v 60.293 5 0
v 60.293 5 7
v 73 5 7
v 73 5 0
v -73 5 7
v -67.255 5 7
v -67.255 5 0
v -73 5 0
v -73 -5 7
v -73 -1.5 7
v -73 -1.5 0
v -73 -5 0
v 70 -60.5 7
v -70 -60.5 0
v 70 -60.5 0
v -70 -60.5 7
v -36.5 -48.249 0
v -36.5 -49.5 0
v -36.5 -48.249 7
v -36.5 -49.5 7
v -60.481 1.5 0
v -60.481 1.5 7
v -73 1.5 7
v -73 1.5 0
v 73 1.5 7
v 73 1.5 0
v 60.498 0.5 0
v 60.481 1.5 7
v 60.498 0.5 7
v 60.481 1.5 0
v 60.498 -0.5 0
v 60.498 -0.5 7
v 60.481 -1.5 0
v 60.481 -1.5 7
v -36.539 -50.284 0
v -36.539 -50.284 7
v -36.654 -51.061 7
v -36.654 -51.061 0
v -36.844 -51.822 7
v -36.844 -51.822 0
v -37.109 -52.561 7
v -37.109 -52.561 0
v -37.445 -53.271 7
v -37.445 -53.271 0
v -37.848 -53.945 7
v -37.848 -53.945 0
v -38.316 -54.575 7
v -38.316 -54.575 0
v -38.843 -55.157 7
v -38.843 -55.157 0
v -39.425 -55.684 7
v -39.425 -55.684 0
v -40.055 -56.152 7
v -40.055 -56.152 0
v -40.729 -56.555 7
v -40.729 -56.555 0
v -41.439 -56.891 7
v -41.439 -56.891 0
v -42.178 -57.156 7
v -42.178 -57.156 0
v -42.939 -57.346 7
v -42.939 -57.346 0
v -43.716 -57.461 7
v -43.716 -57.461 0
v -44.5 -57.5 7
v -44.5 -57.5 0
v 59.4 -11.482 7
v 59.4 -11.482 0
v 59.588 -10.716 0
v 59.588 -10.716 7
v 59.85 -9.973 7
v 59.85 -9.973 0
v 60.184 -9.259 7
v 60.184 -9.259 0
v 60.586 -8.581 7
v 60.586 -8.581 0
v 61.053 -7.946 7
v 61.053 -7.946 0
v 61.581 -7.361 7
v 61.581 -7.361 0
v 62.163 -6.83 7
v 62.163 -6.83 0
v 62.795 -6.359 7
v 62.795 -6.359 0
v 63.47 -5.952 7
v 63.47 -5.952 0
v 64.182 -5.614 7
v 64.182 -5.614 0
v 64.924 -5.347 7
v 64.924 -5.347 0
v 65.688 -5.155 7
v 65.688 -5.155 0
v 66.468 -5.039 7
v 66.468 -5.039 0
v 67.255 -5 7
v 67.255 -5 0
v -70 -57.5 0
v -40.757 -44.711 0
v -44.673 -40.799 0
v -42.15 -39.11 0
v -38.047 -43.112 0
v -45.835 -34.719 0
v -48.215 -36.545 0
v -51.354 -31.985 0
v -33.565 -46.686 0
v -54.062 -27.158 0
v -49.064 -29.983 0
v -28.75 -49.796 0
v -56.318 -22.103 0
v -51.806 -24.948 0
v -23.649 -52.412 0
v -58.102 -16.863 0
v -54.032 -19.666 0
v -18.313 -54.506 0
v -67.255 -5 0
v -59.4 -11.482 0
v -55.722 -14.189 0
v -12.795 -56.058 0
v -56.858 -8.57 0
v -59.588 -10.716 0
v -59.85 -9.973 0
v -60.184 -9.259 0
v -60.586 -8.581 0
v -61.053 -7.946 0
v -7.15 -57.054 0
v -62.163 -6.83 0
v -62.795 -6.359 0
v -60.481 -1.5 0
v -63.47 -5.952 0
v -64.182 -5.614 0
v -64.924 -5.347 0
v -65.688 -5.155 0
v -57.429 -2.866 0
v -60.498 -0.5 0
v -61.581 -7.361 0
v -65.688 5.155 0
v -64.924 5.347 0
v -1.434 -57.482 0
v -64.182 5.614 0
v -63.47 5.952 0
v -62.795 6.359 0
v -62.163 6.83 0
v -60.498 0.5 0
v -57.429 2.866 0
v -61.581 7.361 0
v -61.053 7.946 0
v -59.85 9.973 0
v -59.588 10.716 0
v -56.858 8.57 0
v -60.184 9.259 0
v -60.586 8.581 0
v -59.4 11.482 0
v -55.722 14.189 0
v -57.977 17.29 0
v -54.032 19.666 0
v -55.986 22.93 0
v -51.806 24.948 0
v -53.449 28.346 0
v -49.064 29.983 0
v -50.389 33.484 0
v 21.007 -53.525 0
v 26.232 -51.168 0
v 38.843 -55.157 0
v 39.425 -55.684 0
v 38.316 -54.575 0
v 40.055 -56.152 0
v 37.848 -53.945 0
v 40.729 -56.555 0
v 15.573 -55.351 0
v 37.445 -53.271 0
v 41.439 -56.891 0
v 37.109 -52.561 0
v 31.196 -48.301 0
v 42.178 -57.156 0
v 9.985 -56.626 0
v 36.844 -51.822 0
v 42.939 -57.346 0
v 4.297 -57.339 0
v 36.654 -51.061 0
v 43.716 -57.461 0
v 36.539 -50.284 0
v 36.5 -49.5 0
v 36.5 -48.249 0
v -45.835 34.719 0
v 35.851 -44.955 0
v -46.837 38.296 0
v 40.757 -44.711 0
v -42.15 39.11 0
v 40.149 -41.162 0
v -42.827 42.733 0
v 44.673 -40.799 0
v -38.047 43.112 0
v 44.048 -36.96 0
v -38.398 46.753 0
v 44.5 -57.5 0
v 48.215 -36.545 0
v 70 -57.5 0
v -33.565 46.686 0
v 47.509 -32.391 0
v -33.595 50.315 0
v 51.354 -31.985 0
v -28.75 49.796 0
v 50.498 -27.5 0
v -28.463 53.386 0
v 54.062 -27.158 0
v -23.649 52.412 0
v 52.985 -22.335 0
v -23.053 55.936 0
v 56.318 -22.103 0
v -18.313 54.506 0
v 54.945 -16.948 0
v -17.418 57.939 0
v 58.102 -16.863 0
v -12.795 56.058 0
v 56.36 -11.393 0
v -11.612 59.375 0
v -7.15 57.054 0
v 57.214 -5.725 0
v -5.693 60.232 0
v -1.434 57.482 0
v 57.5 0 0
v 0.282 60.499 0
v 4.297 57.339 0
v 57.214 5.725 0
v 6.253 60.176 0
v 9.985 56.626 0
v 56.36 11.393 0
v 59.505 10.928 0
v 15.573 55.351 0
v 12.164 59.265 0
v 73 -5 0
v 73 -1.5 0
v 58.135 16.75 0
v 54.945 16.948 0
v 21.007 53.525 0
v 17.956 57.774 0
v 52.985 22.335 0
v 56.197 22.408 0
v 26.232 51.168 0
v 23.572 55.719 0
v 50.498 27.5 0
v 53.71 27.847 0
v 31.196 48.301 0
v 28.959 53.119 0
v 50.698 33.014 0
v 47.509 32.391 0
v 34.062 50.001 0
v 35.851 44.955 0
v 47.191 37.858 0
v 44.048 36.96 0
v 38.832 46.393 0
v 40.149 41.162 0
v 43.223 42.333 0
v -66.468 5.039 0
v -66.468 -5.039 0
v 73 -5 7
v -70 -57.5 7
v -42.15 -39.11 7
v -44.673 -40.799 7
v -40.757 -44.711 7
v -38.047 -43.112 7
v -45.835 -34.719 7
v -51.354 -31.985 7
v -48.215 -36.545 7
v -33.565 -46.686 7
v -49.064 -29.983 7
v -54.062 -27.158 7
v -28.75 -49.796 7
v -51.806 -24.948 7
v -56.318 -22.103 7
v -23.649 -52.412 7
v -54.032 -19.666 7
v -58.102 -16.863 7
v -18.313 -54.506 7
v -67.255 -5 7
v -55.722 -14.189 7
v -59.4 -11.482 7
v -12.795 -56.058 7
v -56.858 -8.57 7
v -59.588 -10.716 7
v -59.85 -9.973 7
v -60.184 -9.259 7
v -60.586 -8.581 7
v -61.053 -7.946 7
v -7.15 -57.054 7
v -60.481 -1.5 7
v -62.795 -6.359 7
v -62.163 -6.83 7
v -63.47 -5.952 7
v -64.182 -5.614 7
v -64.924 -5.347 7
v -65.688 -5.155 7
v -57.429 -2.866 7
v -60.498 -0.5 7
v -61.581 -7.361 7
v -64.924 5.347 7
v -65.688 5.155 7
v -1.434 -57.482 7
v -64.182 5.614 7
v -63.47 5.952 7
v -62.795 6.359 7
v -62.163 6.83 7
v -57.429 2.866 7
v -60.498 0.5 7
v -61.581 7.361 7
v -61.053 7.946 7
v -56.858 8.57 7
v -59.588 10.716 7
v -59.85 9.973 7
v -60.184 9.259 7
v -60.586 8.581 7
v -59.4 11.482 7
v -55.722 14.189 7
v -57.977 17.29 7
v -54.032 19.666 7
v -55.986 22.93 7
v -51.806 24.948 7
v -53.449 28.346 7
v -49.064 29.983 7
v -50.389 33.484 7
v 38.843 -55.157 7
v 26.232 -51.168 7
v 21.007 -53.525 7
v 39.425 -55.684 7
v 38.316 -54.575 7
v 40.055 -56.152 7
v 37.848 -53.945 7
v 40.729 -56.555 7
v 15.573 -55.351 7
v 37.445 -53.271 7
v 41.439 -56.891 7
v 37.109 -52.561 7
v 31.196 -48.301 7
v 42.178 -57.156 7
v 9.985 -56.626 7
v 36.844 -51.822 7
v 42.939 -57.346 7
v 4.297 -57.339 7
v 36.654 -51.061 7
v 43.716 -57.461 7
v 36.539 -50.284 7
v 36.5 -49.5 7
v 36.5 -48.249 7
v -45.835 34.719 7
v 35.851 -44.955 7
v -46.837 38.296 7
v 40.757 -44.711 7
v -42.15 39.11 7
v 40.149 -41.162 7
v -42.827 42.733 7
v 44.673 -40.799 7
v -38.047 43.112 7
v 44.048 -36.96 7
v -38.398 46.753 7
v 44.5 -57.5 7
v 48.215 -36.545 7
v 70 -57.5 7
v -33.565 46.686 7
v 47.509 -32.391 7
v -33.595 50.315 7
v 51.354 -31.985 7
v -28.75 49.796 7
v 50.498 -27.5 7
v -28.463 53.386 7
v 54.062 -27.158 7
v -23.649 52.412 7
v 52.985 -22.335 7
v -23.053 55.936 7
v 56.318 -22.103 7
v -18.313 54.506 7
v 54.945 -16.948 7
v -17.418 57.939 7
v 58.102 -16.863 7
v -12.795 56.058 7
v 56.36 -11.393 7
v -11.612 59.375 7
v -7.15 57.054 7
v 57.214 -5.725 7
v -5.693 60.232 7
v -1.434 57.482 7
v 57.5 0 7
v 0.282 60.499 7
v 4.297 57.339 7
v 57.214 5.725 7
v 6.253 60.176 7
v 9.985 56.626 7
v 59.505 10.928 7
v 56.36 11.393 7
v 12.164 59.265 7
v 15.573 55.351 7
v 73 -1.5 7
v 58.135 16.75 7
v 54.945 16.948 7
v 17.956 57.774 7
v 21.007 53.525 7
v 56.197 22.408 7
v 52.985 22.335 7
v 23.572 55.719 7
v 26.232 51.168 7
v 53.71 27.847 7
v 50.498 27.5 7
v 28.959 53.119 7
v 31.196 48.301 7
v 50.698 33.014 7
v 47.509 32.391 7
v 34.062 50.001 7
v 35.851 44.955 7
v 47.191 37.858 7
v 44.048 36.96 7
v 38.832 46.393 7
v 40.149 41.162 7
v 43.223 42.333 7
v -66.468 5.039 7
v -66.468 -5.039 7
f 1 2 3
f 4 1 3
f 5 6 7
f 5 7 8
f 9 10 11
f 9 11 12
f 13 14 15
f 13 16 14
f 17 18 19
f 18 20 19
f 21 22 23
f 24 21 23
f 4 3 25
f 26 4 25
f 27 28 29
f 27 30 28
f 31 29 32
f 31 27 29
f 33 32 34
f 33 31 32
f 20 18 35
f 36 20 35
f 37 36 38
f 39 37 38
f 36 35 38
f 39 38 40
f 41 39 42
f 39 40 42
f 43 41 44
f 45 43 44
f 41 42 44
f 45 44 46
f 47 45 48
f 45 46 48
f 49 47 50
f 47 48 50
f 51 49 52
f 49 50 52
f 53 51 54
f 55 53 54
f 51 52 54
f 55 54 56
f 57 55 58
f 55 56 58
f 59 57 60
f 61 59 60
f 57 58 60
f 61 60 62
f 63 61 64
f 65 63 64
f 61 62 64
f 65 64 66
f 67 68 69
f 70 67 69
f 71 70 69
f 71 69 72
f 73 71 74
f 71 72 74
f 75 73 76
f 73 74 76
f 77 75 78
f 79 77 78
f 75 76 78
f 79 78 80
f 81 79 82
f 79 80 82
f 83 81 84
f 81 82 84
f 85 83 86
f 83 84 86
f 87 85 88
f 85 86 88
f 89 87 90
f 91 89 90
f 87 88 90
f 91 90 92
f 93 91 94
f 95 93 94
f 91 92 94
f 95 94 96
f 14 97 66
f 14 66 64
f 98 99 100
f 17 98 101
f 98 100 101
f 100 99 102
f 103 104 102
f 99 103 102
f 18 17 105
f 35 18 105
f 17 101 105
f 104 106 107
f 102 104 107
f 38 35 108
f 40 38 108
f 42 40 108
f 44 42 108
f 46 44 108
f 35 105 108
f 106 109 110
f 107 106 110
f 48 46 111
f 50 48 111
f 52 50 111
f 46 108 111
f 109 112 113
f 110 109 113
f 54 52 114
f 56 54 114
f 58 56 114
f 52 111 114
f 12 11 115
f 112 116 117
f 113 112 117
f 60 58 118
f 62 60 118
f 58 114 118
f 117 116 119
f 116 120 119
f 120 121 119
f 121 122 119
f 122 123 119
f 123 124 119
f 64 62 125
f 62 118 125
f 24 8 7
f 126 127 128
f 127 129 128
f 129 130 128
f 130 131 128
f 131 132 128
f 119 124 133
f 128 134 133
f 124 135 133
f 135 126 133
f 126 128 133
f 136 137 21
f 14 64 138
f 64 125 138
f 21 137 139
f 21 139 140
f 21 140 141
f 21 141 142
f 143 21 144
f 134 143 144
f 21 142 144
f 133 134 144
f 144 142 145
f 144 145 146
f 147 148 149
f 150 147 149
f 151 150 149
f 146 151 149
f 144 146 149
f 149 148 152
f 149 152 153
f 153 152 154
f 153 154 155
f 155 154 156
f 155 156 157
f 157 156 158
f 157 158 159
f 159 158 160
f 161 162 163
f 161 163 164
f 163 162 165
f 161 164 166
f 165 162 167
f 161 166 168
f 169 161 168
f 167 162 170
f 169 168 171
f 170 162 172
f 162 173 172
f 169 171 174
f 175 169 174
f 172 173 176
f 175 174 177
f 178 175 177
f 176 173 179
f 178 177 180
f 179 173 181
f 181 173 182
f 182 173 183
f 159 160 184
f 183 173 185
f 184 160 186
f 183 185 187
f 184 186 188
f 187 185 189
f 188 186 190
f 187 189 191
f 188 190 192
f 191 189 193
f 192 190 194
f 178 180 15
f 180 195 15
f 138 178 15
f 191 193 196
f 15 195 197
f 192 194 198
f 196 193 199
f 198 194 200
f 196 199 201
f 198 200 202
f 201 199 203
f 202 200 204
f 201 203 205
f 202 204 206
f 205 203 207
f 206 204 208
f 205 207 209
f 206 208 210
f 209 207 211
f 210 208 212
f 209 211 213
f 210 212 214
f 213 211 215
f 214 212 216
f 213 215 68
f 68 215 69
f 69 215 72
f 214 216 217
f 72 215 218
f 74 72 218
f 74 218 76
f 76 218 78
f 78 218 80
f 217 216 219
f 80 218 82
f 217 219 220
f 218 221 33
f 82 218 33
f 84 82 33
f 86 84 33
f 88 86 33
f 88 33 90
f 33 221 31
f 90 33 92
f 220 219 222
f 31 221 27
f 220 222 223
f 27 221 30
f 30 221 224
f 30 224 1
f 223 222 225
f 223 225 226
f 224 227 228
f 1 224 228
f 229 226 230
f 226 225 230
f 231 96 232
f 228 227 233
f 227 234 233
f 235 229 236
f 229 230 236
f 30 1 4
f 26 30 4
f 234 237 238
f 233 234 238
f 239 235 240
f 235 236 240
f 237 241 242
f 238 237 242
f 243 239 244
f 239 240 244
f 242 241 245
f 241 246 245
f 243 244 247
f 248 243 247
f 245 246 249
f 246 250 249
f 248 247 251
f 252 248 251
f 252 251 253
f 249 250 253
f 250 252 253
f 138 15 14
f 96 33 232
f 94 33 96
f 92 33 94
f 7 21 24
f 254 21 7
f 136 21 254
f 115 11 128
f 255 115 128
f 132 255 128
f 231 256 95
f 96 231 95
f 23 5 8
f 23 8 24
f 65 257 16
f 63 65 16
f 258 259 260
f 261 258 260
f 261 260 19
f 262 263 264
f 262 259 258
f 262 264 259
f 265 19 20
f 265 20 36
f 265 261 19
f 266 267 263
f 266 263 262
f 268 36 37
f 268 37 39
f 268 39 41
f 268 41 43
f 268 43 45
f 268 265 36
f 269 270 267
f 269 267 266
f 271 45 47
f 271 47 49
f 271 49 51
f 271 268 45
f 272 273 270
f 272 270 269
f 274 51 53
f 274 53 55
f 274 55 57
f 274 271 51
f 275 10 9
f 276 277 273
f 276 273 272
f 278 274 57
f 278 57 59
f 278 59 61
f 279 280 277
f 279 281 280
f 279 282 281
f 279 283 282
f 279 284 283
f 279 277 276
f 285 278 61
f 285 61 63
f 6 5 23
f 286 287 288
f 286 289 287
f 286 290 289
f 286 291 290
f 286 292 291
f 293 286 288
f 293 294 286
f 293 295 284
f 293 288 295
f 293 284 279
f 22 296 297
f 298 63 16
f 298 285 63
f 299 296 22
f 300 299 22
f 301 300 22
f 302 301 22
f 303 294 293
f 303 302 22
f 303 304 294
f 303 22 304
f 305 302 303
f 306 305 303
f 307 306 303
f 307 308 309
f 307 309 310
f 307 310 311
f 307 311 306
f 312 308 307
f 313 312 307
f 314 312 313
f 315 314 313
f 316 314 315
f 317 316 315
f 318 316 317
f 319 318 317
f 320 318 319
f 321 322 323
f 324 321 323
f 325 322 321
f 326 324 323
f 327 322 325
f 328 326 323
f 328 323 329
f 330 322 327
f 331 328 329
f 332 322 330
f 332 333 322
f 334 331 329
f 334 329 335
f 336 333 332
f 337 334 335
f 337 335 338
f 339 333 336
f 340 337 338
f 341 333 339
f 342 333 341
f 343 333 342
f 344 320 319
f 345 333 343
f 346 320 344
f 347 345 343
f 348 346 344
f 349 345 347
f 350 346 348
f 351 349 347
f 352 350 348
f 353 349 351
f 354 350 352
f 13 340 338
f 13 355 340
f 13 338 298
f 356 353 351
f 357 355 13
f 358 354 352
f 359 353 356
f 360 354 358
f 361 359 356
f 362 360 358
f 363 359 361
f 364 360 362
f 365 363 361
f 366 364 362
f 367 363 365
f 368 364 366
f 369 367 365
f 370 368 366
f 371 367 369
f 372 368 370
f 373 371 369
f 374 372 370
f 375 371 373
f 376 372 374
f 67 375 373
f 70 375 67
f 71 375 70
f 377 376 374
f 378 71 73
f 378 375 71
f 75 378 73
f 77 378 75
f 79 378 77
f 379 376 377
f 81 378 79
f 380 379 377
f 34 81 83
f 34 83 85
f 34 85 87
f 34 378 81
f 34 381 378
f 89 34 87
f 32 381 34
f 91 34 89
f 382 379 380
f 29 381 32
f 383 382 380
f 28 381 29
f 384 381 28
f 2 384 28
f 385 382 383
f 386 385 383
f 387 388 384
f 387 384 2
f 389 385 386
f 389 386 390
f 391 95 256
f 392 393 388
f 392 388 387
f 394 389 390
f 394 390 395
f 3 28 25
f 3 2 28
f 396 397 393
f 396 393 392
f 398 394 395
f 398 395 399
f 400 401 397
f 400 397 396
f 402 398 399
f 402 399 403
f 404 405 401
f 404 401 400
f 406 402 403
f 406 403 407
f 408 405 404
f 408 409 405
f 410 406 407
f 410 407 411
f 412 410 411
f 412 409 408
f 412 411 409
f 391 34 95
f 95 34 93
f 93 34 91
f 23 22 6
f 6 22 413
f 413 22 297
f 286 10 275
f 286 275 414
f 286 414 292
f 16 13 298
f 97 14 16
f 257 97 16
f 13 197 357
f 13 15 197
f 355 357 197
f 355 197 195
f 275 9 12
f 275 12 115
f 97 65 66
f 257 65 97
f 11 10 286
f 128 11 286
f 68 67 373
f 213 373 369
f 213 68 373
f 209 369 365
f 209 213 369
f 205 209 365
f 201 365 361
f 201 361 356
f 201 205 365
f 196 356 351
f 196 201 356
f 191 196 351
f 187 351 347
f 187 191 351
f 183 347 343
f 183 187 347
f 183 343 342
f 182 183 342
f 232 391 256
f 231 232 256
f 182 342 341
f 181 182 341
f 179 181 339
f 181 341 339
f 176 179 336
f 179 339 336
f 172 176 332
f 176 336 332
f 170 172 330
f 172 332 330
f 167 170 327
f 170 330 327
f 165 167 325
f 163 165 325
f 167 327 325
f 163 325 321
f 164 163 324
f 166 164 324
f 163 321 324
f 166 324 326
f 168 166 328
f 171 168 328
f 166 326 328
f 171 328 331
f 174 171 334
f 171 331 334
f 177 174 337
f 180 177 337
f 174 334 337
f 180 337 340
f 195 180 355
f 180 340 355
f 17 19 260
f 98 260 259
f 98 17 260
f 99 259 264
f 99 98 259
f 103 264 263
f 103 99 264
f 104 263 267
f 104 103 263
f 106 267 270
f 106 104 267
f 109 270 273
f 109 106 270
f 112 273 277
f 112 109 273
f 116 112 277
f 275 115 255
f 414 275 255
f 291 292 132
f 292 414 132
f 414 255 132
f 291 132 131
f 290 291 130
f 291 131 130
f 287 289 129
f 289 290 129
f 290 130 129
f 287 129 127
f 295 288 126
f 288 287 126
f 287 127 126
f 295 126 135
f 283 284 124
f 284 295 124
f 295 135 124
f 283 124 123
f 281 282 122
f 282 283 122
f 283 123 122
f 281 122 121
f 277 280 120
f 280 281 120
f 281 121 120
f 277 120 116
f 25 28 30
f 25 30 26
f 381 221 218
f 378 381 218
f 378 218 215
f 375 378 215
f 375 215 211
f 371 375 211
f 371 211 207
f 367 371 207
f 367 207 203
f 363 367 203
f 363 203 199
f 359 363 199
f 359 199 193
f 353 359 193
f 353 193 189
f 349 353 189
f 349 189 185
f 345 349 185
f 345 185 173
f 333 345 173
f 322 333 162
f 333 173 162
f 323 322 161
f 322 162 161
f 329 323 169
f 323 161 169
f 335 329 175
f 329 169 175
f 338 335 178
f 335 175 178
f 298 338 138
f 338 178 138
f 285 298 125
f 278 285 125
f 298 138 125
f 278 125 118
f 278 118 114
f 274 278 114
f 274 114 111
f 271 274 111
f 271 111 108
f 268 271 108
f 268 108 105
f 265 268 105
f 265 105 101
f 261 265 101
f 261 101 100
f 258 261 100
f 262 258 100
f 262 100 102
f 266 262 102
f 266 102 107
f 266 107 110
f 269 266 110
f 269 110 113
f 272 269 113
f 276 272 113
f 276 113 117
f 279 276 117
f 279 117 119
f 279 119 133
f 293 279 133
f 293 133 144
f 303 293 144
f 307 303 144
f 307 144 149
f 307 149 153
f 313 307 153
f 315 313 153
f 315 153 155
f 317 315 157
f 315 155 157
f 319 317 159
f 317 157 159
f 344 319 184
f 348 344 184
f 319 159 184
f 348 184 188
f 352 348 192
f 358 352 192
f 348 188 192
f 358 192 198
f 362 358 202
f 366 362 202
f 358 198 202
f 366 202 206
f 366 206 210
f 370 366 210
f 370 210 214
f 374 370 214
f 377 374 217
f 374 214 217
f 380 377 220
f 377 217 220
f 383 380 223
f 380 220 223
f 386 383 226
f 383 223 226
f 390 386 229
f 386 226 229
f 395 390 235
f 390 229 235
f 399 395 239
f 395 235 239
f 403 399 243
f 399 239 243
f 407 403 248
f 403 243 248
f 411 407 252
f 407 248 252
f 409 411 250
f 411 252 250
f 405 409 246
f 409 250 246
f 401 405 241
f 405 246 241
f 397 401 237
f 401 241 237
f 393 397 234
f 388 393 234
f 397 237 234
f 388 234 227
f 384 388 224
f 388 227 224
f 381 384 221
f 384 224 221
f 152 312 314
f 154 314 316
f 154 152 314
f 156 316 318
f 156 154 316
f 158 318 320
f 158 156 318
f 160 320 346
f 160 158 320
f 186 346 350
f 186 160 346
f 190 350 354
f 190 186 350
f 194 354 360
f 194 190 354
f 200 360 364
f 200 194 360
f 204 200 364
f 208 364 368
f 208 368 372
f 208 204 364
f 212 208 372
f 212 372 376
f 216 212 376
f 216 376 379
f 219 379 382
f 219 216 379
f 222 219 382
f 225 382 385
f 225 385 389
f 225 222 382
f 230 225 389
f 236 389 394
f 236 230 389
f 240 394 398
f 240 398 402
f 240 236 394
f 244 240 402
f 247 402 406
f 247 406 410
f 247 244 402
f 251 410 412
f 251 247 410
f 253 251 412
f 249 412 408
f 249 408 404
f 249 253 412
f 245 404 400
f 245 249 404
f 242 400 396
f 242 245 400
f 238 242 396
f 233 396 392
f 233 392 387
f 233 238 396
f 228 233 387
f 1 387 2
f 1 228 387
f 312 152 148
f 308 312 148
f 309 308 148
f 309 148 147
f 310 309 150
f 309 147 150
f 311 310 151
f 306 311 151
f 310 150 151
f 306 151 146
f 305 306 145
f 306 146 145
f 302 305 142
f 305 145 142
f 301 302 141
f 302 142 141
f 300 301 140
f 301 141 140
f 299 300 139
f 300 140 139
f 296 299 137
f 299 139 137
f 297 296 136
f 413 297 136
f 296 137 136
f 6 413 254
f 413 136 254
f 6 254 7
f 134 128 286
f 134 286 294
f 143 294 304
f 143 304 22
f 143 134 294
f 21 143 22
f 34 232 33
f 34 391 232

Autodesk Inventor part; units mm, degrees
ref_plane "YZ Plane" through (0, 0, 0) normal (1, 0, 0) x (0, 1, 0)
ref_plane "XY Plane" through (0, 0, 0) normal (0, 0, 1) x (1, 0, 0)
sketch "Sketch1" plane through (0, 0, 0) normal (0, 0, 1) x (1, 0, 0)
  circle A0 centre (0, 0) radius 57.5
  circle A1 centre (0, 0) radius 60.5
  dimension "d0" = 115
  dimension "d1" = 121
extrude "Extrusion1" add sketch "Sketch1" along normal blind 7
ref_plane "Work Plane1" through (0, -59, 0) normal (0, 1, 0) x (-1, 0, 0)
sketch "Sketch2" plane through (0, -59, 0) normal (0, 1, 0) x (-1, 0, 0)
  point P0 (0, 0)
sketch "Sketch3" plane through (0, -59, 0) normal (0, 1, 0) x (-1, 0, 0)
  line L0 (0, 0) -> (-70, 0)
  line L1 (-70, 0) -> (-70, 7)
  line L2 (-70, 7) -> (0, 7)
  line L3 (0, 7) -> (0, 0)
  line L4 (0, 0) -> (70, 0)
  line L5 (70, 0) -> (70, 7)
  line L6 (70, 7) -> (0, 7)
  dimension "d5" = 70
  dimension "d6" = 7
extrude "Extrusion2" add sketch "Sketch3" along normal mid plane 3
sketch "Sketch4" plane through (0, 0, 7) normal (0, 0, 1) x (1, 0, 0)
  line L0 (48, 5) -> (73, 5)
  line L1 (73, 5) -> (73, -5)
  line L2 (73, -5) -> (48, -5)
  line L3 (48, -5) -> (48, 5)
  line L4 (48, 5) -> (73, -5) construction
  line L5 (73, 5) -> (48, -5) construction
  line L6 (48, 1.5) -> (73, 1.5)
  line L7 (73, 1.5) -> (73, -1.5)
  line L8 (73, -1.5) -> (48, -1.5)
  line L9 (48, -1.5) -> (48, 1.5)
  line L10 (48, 1.5) -> (73, -1.5) construction
  line L11 (73, 1.5) -> (48, -1.5) construction
  line L12 (0, 0) -> (0, -12.7)
  line L13 (-48, 5) -> (-73, 5)
  line L14 (-73, 5) -> (-73, -5)
  line L15 (-73, -5) -> (-48, -5)
  line L16 (-48, -5) -> (-48, 5)
  line L17 (-48, 5) -> (-73, -5) construction
  line L18 (-73, 5) -> (-48, -5) construction
  line L19 (-48, 1.5) -> (-73, 1.5)
  line L20 (-73, 1.5) -> (-73, -1.5)
  line L21 (-73, -1.5) -> (-48, -1.5)
  line L22 (-48, -1.5) -> (-48, 1.5)
  line L23 (-48, 1.5) -> (-73, -1.5) construction
  line L24 (-73, 1.5) -> (-48, -1.5) construction
  line L25 (-70, -60.5) -> (70, -60.5) projected
  line L26 (36.5, -75) -> (-36.5, -75)
  line L27 (-36.5, -75) -> (-36.5, -46)
  line L28 (-36.5, -46) -> (36.5, -46)
  line L29 (36.5, -46) -> (36.5, -75)
  line L30 (36.5, -75) -> (-36.5, -46) construction
  line L31 (-36.5, -75) -> (36.5, -46) construction
  line L32 (36.5, -60.5) -> (-36.5, -60.5)
  arc A0 (60.293, -5) -> (60.293, 5) centre (0, 0) ccw
  arc A1 (-60.293, 5) -> (-60.293, -5) centre (0, 0) ccw
  arc A2 (-36.5, -48.2494) -> (36.5, -48.2494) centre (0, 0) ccw
  point P0 (60.5, 0)
  point P1 (60.5, 0)
  point P2 (-60.5, 0)
  point P3 (-60.5, 0)
  point P4 (0, -60.5)
  point P5 (-60.4814, -1.5)
  point P6 (-60.4814, 1.5)
  point P7 (0, -60.5)
  point P8 (60.4814, -1.5)
  point P9 (60.4814, 1.5)
  dimension "d10" = 25
  dimension "d11" = 10
  dimension "d12" = 25
  dimension "d13" = 3
  dimension "d17" = 73
  dimension "d18" = 29
extrude "Extrusion3" add sketch "Sketch4" against normal blind 7 contours L0 L1 L6 A0 | L8 L1 L2 A0 | A1 L19 L14 L13 | A1 L15 L14 L21 | L27 A2 L25 | A2 L29 L25
fillet "Fillet1" radius 8 5 edges at (-60.293, -5, 3.5) (-60.293, 5, 3.5) (60.293, -5, 3.5) (36.5, -57.5, 3.5) (-36.5, -57.5, 3.5)
properties part number "EXTRA_PARA CORTE DE TUBO"
